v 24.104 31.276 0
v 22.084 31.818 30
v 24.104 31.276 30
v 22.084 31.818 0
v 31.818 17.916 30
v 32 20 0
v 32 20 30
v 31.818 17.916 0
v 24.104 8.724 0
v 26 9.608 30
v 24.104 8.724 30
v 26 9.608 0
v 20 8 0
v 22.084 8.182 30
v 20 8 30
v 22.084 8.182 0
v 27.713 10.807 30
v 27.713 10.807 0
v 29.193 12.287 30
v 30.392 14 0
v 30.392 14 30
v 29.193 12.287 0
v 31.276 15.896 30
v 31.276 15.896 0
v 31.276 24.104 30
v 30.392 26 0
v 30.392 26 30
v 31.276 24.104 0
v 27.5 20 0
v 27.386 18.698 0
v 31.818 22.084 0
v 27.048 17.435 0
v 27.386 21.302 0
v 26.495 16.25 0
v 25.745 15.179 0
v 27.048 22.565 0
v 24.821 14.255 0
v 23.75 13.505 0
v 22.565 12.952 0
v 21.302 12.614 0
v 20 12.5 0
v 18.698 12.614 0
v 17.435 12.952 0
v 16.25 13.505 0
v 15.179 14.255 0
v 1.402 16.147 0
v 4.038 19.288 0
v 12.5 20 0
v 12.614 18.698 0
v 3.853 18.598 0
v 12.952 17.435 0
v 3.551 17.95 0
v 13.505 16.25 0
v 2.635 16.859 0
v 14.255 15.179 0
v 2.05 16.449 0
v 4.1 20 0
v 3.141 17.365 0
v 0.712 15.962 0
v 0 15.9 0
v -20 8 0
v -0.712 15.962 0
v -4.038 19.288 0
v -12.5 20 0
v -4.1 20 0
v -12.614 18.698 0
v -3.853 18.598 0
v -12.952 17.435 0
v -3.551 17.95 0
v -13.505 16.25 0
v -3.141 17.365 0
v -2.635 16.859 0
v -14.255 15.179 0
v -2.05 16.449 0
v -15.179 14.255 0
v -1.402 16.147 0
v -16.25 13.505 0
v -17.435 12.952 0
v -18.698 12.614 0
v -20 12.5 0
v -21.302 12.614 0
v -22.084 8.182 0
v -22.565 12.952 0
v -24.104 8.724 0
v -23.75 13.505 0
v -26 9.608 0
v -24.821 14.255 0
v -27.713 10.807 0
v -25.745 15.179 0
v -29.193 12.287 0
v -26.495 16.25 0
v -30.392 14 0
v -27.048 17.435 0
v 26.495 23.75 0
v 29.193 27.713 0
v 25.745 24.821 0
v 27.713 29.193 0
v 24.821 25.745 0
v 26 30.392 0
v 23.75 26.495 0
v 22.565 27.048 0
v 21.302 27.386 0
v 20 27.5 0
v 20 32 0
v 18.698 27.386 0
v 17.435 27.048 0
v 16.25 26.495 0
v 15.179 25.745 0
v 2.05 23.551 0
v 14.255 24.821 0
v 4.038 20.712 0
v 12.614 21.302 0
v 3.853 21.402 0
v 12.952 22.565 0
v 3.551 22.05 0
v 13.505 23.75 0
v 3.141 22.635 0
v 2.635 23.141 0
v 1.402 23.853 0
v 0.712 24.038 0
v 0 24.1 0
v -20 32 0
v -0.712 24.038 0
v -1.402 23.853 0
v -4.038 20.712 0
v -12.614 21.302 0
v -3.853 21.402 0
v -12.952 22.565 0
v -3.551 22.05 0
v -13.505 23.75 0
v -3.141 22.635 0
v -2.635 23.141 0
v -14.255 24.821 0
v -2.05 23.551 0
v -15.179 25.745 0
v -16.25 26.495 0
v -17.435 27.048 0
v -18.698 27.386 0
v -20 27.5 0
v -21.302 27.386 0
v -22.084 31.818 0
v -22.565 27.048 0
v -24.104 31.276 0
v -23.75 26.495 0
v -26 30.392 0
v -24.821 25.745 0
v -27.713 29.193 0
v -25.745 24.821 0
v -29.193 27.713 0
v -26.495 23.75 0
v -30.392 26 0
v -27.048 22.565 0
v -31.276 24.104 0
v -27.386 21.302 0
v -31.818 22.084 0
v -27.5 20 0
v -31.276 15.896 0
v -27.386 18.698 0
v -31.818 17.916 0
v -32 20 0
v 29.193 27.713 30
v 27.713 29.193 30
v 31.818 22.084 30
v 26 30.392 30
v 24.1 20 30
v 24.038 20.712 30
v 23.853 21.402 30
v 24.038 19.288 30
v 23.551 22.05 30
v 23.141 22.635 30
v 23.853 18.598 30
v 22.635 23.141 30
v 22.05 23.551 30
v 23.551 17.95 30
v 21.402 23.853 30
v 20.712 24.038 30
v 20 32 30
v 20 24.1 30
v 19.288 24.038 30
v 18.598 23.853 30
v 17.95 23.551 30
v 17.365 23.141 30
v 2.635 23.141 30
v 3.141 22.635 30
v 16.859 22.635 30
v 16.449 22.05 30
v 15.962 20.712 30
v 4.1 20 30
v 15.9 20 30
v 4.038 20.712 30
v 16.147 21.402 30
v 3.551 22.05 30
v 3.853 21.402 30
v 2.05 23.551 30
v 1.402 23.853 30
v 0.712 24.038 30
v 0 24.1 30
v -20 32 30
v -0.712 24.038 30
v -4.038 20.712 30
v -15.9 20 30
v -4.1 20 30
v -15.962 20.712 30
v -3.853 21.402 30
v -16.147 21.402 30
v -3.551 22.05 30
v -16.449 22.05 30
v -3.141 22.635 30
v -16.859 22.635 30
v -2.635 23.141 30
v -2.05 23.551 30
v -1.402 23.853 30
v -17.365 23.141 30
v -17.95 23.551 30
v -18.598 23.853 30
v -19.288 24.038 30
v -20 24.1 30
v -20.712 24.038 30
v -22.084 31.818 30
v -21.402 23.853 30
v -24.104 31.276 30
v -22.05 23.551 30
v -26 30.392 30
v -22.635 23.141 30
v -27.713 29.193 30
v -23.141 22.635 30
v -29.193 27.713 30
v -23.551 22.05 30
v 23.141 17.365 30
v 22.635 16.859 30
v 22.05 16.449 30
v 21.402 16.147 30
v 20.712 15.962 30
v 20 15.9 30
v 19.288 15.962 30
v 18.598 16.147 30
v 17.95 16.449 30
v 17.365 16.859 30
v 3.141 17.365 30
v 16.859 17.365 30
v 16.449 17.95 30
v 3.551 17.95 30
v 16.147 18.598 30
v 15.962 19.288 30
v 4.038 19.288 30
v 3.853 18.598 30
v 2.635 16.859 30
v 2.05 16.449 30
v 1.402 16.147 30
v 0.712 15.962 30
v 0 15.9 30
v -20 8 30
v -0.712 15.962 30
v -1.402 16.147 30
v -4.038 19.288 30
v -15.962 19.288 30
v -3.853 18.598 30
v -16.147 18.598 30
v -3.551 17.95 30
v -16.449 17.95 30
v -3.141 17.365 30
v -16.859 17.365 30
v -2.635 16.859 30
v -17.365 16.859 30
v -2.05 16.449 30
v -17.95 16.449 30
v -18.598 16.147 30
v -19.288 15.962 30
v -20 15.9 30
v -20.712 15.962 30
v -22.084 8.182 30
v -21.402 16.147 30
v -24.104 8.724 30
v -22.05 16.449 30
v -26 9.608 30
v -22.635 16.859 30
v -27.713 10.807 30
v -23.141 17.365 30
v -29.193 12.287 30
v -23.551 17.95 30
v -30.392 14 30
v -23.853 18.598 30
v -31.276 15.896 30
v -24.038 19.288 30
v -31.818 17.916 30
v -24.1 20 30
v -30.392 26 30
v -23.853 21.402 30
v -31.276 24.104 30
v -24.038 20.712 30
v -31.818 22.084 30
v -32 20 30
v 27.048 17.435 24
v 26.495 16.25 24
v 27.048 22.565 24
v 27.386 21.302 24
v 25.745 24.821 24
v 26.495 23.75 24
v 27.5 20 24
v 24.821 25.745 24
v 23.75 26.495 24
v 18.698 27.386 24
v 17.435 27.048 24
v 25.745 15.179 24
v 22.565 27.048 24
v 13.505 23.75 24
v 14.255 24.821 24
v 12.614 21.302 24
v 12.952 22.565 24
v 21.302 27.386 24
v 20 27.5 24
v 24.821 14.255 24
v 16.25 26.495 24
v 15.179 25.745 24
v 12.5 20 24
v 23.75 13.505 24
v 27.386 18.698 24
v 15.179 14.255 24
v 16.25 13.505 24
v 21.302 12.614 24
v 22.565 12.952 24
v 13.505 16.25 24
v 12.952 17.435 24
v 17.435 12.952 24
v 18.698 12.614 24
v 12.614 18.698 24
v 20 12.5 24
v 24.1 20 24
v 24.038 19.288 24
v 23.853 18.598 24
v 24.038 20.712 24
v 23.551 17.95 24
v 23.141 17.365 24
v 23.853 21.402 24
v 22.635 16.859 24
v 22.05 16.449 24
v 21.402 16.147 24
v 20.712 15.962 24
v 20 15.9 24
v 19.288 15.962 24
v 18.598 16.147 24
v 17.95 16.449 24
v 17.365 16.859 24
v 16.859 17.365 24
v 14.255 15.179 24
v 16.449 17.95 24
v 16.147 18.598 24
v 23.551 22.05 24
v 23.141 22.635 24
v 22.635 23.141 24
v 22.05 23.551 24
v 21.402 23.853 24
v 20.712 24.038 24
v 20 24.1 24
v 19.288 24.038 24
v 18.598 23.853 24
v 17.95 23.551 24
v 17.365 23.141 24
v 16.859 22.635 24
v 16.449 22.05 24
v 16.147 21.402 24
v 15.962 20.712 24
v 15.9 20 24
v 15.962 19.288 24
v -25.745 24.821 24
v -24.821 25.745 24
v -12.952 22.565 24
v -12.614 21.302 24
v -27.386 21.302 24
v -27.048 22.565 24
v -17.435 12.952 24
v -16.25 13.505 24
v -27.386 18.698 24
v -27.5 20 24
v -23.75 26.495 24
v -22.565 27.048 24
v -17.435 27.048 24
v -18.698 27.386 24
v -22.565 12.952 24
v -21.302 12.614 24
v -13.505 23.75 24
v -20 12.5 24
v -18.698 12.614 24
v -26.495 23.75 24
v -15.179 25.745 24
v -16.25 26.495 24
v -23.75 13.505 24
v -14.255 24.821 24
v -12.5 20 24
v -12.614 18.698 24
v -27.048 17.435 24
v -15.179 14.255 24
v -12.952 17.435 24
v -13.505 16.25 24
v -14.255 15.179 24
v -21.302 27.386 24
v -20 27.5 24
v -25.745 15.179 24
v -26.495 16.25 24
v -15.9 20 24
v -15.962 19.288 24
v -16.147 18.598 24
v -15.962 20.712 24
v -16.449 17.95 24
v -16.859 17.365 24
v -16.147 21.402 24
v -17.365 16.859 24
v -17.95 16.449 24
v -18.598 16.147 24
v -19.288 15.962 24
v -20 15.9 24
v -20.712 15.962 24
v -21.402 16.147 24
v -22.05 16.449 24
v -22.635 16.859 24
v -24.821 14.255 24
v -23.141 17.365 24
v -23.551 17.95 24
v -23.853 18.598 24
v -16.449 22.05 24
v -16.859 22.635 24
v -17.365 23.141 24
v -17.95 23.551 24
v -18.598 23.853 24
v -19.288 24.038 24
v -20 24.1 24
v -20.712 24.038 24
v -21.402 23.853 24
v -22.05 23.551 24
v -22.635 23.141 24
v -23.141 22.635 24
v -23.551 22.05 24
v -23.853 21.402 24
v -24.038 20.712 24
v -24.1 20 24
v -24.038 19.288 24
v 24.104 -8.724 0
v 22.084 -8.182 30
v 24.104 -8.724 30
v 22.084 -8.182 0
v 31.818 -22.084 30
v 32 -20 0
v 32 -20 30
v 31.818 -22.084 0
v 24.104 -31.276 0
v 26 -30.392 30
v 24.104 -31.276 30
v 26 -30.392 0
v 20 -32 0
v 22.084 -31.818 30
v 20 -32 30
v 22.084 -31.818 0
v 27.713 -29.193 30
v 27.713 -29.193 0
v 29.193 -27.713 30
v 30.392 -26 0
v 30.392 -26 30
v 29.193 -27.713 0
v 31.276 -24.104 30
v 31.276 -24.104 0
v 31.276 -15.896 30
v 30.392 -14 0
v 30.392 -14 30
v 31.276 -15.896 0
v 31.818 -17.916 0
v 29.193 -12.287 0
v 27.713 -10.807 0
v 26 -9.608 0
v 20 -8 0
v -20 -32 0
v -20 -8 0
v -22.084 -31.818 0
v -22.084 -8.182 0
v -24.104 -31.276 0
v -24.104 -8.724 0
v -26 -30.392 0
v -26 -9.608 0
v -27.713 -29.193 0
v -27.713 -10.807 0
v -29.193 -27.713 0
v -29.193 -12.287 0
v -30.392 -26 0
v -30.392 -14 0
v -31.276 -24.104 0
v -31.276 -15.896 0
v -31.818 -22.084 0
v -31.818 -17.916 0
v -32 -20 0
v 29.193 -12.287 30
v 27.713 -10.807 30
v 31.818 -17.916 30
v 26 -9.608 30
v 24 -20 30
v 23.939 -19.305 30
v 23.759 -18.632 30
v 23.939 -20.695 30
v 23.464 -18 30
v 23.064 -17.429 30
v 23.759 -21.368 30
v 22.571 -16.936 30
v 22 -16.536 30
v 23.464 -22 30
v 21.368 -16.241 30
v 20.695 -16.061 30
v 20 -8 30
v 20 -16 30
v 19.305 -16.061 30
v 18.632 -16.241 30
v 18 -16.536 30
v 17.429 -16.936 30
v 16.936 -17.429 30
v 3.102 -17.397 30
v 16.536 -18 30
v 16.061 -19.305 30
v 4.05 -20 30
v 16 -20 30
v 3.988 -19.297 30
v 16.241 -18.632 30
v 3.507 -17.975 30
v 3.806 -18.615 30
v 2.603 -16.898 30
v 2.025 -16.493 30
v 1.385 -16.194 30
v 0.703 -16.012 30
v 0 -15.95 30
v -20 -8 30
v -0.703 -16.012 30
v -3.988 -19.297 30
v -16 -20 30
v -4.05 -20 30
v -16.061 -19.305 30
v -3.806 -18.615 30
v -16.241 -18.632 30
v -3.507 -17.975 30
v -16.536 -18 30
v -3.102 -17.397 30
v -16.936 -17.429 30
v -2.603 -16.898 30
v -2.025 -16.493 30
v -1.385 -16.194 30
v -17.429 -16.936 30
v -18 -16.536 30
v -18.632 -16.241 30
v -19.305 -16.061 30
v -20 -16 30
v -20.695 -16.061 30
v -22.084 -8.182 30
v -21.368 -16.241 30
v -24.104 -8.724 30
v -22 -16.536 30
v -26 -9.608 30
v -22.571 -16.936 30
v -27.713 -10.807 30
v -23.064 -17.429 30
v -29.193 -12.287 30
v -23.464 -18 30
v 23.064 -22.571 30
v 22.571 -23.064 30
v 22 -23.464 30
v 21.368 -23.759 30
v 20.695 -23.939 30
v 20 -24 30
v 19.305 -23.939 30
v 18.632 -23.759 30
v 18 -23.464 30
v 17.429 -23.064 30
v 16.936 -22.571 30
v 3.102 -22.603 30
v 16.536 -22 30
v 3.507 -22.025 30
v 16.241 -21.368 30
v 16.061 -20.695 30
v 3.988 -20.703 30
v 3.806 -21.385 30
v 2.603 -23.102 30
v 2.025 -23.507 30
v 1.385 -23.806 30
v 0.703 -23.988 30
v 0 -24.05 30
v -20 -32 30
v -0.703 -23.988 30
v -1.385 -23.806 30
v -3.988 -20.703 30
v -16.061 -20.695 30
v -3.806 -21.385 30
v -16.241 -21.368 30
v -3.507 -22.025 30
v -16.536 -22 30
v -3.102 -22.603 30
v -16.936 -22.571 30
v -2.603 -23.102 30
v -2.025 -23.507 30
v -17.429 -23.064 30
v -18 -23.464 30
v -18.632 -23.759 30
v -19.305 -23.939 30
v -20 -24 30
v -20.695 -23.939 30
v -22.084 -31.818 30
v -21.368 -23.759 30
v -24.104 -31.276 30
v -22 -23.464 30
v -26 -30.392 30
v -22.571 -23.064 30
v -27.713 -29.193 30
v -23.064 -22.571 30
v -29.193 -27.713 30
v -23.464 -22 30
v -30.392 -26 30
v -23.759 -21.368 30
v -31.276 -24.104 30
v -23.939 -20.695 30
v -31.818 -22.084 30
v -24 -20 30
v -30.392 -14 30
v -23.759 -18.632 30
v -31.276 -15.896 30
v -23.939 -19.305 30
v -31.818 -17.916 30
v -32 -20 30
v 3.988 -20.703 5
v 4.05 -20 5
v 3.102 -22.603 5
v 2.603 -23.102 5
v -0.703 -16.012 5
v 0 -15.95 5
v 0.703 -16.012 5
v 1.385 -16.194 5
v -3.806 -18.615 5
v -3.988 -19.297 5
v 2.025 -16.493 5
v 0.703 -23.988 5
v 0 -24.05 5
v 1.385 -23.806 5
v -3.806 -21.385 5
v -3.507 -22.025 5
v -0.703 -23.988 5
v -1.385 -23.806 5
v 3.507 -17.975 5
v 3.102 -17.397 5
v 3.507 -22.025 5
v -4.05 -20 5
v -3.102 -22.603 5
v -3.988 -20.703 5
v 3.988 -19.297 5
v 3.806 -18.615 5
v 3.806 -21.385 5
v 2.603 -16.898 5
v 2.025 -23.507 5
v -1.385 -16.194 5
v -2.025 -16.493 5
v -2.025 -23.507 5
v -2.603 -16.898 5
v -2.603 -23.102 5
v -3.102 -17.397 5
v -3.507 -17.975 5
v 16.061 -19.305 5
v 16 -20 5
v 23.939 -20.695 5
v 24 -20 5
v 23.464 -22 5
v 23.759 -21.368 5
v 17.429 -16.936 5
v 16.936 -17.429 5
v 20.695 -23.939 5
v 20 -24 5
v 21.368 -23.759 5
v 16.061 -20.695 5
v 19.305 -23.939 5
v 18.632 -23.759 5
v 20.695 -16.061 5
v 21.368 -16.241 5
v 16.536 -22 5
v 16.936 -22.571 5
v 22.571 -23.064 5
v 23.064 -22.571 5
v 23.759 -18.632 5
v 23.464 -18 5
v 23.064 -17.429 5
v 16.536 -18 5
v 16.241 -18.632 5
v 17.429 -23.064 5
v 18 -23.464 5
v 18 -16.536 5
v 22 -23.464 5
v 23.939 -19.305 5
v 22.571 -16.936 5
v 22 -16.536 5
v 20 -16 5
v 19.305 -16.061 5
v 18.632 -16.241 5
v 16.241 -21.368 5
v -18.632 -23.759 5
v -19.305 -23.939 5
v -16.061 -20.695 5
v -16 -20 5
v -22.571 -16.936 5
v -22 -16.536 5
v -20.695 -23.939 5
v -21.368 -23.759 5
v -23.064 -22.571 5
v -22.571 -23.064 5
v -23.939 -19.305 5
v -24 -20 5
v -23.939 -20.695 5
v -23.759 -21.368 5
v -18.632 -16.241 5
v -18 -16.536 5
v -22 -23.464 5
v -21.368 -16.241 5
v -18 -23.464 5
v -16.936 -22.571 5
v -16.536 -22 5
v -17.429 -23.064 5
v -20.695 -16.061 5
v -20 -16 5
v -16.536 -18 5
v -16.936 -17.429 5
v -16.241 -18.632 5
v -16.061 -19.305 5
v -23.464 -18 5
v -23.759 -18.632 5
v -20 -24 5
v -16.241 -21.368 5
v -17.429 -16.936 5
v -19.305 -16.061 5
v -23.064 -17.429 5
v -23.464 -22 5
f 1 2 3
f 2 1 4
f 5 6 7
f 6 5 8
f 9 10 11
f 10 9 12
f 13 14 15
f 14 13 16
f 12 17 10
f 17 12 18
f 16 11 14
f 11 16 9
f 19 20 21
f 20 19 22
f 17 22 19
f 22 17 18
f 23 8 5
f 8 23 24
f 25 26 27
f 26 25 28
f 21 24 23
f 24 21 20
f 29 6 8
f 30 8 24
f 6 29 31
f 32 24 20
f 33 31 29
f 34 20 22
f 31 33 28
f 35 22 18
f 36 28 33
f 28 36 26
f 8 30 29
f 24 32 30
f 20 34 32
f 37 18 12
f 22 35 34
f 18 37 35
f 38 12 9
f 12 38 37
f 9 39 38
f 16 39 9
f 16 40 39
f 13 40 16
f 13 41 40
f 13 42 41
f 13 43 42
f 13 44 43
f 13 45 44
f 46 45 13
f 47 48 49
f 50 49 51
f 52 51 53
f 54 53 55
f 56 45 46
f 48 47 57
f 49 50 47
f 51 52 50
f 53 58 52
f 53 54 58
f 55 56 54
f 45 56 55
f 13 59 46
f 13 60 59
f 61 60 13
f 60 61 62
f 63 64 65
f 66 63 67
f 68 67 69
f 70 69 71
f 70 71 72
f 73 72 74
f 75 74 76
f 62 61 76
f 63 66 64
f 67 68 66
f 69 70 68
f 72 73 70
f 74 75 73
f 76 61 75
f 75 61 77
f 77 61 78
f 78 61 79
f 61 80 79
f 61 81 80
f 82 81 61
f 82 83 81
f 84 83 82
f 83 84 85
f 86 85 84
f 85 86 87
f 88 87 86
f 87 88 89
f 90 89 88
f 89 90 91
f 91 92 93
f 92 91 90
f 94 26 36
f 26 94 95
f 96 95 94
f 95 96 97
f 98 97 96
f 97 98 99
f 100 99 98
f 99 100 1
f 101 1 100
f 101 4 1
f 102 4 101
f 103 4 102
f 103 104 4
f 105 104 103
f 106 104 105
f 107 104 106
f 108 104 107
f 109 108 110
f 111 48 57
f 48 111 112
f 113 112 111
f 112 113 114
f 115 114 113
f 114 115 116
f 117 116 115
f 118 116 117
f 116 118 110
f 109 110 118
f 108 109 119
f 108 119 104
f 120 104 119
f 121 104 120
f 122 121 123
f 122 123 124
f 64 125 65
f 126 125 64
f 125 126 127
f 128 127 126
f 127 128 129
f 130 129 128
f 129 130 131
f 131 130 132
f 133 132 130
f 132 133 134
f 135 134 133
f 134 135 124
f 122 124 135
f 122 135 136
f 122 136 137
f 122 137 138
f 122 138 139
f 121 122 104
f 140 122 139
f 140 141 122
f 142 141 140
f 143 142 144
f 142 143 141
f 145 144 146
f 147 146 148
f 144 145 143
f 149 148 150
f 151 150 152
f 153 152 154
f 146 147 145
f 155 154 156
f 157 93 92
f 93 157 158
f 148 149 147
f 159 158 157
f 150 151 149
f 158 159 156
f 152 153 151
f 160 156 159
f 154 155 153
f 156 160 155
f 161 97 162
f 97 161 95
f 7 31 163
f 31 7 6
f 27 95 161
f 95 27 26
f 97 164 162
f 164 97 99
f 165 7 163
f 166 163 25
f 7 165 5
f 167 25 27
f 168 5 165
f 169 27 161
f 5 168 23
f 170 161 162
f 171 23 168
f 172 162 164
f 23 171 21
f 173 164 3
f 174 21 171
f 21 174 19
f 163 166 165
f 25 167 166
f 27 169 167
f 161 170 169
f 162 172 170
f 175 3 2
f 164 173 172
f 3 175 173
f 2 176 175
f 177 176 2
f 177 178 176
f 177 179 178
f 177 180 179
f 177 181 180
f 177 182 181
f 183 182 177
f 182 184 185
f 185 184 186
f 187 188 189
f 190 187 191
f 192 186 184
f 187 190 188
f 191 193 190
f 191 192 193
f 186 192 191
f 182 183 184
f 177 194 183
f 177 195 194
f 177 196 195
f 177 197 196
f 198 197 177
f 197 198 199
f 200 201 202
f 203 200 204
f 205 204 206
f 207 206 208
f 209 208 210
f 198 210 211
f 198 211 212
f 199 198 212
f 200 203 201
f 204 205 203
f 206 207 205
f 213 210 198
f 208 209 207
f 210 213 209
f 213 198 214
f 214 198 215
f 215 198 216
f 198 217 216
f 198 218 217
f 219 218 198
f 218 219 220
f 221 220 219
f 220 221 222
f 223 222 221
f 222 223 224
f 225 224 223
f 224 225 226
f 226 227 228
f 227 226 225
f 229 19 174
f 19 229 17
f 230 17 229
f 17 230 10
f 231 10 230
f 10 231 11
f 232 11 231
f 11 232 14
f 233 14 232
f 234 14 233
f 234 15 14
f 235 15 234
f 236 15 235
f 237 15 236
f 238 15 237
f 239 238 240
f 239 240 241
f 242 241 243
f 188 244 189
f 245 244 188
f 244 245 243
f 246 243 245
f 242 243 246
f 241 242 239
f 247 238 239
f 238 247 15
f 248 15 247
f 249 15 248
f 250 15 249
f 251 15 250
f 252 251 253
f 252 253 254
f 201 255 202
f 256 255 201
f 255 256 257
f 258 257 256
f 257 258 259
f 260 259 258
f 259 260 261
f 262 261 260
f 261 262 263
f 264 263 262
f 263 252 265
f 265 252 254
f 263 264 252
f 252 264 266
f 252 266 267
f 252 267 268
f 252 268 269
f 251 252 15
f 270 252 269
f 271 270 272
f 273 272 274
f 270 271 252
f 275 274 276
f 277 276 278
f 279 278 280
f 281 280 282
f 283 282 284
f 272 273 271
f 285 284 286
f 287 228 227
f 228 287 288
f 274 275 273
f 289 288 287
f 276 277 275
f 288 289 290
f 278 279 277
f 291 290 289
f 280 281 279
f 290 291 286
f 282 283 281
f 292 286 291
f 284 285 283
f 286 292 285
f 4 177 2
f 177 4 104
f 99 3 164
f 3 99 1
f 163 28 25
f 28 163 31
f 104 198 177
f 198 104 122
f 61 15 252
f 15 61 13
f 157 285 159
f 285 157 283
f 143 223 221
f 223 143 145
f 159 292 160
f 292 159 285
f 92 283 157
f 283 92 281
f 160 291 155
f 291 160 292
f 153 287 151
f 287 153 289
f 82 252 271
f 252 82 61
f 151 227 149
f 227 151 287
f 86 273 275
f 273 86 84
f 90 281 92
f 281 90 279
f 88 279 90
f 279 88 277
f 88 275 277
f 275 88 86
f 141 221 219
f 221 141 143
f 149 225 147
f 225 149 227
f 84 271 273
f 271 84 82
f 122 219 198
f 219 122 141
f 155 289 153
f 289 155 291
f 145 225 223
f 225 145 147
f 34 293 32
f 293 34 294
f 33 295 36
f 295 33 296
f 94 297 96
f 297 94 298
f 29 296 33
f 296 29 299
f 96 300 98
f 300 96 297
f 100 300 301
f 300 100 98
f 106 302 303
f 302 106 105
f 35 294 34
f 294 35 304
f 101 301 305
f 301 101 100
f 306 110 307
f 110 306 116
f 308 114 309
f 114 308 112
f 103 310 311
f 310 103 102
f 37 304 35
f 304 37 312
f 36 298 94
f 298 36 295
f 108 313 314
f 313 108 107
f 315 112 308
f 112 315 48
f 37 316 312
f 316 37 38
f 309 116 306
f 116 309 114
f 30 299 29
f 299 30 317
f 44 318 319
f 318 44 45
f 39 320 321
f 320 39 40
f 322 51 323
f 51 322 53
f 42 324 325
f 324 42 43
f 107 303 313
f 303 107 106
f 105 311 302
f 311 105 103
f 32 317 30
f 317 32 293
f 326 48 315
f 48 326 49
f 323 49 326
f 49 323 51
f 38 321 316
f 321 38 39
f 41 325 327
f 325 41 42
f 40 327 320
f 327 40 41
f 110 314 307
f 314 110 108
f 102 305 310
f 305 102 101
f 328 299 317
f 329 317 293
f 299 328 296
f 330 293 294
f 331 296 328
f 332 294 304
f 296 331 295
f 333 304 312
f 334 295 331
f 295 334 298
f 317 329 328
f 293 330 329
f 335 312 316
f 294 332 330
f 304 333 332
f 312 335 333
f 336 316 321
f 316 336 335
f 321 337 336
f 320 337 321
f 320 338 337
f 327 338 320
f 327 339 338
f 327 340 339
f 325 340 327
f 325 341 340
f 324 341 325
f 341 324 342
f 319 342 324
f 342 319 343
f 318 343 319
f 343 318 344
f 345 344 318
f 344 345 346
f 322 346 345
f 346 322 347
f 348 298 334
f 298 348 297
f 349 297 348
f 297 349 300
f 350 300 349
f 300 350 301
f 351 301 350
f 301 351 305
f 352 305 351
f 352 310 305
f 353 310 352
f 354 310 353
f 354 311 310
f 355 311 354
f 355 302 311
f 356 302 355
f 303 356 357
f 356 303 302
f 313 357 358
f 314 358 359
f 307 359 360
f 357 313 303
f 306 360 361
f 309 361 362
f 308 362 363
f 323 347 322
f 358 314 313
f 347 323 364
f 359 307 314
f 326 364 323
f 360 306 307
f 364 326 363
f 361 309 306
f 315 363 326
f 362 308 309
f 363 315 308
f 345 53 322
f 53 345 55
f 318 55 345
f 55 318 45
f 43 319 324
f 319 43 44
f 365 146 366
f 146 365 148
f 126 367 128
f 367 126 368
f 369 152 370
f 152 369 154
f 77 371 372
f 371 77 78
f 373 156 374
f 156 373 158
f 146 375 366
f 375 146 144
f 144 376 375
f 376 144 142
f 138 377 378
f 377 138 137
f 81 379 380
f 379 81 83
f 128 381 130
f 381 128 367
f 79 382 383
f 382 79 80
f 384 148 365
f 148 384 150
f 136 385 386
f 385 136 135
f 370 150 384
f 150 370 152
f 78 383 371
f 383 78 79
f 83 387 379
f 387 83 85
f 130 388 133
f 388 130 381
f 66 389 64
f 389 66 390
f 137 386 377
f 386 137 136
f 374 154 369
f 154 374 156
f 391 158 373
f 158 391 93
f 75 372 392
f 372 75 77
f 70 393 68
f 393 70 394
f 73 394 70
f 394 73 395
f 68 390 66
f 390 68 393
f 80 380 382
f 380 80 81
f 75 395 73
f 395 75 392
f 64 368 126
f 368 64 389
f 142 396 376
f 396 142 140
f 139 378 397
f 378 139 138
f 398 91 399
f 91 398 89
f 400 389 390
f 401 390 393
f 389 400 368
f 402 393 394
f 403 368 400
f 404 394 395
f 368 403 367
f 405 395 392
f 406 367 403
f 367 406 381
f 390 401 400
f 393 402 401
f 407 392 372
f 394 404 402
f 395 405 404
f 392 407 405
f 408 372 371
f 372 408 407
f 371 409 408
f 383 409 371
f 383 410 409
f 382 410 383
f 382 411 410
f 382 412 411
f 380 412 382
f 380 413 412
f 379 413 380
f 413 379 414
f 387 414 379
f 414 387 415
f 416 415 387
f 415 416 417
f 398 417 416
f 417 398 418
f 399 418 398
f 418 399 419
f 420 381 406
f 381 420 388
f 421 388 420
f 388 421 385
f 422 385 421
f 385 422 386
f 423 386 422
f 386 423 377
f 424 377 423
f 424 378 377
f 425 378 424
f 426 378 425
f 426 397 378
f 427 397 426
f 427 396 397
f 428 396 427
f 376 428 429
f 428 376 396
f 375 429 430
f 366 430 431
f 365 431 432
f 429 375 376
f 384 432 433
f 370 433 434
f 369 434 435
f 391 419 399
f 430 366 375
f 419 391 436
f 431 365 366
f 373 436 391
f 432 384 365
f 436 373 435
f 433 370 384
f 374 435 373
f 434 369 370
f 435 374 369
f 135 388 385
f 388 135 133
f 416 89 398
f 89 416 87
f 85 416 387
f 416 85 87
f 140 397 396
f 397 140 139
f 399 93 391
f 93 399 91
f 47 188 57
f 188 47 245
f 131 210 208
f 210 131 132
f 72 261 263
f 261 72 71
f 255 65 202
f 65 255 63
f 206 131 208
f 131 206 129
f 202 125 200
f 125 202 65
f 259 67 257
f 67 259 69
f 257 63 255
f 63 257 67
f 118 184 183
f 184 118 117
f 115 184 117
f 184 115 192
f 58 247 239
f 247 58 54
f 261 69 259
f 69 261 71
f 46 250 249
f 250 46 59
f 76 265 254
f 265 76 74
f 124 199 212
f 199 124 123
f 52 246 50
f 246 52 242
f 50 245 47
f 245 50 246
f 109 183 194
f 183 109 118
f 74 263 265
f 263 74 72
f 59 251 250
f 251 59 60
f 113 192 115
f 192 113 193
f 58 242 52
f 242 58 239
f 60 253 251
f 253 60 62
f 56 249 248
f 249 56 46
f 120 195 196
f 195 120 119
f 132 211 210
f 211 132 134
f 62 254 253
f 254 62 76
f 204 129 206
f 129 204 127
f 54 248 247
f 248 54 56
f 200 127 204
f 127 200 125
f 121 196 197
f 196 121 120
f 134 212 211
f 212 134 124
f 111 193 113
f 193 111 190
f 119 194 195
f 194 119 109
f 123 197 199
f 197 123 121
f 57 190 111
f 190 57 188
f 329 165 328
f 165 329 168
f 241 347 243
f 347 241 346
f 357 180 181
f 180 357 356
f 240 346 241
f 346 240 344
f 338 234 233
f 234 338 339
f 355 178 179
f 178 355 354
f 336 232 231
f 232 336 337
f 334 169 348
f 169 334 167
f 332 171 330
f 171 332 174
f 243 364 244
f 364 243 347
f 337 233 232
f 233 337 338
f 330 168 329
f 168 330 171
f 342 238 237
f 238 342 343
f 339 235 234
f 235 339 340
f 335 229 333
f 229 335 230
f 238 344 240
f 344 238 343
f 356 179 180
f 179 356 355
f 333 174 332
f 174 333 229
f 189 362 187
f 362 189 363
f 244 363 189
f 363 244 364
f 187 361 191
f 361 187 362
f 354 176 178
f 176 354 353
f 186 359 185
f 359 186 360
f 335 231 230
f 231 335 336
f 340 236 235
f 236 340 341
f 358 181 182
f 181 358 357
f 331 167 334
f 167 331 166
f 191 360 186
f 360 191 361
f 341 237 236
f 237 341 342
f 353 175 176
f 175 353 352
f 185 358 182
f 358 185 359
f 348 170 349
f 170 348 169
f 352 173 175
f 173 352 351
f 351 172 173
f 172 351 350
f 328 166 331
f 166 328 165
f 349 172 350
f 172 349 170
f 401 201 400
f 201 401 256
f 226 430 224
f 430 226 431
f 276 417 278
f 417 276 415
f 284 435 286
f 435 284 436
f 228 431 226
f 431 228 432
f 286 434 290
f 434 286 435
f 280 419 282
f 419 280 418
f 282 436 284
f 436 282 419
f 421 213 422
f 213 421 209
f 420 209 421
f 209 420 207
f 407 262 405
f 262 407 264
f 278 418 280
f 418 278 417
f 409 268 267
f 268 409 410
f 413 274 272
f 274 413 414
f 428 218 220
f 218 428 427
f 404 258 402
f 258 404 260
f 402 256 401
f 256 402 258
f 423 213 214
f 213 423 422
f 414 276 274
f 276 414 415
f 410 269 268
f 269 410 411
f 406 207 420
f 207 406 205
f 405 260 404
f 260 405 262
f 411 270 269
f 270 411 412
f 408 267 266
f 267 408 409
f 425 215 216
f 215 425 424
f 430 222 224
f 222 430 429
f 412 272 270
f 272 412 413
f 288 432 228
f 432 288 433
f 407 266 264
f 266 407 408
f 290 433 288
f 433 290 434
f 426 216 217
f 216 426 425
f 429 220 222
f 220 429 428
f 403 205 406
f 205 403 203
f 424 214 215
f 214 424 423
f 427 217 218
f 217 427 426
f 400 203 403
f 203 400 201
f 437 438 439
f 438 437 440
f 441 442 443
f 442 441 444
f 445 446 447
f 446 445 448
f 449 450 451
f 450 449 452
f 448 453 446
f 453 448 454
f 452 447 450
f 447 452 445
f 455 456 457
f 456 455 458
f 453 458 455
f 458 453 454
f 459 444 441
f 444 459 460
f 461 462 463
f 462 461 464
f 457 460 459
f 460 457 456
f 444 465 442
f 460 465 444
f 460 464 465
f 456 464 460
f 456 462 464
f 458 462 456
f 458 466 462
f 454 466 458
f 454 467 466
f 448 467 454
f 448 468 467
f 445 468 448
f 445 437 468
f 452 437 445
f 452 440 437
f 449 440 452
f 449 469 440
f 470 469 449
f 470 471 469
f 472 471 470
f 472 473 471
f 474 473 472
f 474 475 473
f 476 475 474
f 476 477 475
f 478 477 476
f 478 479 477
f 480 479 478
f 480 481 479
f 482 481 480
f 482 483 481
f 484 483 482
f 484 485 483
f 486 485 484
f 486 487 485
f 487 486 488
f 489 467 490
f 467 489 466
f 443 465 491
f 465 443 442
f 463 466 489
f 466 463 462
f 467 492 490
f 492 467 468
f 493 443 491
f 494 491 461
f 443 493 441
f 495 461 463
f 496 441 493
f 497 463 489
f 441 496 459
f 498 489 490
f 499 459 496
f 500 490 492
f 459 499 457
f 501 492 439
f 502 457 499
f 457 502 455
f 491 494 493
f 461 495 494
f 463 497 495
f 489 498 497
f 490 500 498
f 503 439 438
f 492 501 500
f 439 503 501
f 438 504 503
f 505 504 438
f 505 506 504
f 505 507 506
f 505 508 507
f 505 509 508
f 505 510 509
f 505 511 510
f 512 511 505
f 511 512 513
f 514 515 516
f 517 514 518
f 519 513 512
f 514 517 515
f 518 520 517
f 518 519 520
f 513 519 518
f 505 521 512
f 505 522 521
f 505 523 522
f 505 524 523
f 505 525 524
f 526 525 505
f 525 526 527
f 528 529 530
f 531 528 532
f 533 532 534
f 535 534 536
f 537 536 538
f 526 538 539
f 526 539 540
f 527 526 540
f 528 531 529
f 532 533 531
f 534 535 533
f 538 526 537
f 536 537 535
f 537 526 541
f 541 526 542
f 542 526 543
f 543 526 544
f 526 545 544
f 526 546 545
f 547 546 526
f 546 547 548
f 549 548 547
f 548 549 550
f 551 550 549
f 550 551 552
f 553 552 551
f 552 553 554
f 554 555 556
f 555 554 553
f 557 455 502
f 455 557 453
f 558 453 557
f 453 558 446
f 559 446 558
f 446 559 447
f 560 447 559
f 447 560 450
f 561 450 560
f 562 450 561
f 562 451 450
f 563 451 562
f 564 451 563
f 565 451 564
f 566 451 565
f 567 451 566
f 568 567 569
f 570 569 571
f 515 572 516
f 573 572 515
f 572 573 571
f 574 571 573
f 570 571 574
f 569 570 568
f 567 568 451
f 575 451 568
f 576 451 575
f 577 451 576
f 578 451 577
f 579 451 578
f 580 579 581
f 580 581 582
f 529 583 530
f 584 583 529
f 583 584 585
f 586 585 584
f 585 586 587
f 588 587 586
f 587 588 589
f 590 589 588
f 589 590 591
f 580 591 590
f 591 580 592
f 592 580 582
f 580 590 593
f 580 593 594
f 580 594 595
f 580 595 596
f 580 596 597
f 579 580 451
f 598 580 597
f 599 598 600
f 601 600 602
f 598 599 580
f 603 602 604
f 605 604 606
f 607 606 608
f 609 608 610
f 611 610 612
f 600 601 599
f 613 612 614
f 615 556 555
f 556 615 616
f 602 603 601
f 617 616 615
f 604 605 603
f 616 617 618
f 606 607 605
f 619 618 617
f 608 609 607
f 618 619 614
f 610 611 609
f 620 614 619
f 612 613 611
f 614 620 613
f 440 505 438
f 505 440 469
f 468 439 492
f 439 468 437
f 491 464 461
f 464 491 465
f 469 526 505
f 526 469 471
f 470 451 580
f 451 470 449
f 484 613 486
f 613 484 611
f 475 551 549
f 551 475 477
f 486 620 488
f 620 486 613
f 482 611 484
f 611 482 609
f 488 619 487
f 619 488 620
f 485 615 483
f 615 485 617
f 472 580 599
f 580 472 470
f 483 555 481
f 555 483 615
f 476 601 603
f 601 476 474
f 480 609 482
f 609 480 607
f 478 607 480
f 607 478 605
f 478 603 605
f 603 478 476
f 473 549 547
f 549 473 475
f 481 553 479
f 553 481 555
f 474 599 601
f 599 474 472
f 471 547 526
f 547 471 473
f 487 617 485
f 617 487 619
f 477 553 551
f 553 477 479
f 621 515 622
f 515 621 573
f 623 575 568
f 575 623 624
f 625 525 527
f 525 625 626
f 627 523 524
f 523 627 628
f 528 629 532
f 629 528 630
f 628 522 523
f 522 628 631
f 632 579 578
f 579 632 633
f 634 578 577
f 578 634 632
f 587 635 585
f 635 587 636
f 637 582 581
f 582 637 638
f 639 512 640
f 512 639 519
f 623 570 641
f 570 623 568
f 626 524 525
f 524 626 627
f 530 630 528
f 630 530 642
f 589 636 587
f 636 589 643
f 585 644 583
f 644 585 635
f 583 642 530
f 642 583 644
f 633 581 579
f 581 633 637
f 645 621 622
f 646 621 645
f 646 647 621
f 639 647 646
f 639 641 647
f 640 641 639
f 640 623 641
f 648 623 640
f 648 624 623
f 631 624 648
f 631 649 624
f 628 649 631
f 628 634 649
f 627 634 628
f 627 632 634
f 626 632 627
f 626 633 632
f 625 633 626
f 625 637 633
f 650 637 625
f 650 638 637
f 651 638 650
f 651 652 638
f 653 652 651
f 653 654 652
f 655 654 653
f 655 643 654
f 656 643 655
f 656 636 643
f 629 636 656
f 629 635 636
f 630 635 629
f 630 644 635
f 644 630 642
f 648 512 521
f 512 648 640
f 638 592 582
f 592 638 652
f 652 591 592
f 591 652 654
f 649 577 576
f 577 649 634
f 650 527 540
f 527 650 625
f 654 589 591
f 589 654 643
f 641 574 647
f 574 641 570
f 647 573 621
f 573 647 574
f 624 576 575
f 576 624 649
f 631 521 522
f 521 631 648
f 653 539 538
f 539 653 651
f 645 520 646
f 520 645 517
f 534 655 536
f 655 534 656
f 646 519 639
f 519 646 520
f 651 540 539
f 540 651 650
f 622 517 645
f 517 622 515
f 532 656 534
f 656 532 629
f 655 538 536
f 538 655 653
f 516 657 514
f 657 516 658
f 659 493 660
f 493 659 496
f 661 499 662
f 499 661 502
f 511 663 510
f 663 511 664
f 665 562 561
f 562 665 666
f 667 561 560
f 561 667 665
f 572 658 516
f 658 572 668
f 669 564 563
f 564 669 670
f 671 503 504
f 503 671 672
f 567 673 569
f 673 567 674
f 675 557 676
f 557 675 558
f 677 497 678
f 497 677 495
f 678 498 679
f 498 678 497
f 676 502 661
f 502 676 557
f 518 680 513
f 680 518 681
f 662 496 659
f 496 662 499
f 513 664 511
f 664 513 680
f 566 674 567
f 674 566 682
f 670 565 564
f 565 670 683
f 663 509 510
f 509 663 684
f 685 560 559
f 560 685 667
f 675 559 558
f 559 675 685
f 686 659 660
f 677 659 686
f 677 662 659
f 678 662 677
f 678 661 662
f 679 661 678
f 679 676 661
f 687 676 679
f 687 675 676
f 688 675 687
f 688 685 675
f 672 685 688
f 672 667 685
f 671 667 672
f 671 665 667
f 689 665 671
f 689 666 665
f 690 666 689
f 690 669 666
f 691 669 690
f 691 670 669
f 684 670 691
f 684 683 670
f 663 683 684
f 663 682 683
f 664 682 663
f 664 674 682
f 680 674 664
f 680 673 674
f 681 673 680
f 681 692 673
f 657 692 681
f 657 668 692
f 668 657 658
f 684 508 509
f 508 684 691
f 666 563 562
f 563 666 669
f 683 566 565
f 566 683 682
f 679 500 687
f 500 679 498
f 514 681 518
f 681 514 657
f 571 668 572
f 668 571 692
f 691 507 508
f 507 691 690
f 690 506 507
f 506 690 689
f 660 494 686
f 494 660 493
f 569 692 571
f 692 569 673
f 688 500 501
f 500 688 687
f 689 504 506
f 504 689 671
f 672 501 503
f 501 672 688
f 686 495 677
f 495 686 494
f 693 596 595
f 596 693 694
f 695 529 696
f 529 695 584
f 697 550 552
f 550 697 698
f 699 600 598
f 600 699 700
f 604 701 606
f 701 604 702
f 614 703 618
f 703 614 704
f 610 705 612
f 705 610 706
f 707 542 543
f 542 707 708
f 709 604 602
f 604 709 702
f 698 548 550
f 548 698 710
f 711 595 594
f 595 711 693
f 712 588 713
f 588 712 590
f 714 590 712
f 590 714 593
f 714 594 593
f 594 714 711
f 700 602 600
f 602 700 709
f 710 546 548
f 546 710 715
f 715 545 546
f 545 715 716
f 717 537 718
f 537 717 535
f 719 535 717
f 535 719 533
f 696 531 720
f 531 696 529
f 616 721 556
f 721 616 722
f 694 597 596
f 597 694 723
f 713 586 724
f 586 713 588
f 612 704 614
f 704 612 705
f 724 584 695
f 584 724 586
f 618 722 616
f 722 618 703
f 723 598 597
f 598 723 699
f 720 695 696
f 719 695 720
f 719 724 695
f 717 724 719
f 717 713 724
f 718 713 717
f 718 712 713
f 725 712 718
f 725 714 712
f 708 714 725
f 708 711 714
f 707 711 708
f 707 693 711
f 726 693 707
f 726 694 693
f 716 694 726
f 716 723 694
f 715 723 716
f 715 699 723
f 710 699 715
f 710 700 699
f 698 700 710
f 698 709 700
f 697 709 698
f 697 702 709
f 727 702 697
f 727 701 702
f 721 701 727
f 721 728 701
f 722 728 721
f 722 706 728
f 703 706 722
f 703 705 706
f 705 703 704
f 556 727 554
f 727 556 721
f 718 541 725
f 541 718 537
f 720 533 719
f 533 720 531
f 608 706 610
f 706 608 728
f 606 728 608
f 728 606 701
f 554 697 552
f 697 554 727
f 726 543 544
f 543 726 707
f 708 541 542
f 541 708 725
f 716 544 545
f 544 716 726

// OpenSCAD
$fn=36;

d=20;
//linear_extrude(15) circle(4.15);
translate([0,20,0]) car(d);
module car(d) {
    difference() {
        union() {
            translate([d, 0, 0]) linear_extrude(30) circle(12);

            linear_extrude(30) square([d*2, 24],true);

            translate([-d, 0, 0]) linear_extrude(30) circle(12);
        }
        translate([d, 0, 0]) linear_extrude(24) circle(7.5);
        translate([-d, 0, 0]) linear_extrude(24) circle(7.5);
        
        translate([0, 0, 0]) linear_extrude(100) circle(4.10);
        translate([d, 0, 0]) linear_extrude(100) circle(4.10);
        translate([-d, 0, 0]) linear_extrude(100) circle(4.10);
    }
}

translate([0,-20,0]) frame(d);
module frame(d) {
    difference() {
        union() {
            translate([d, 0, 0]) linear_extrude(30) circle(12);

            linear_extrude(30) square([d*2, 24],true);

            translate([-d, 0, 0]) linear_extrude(30) circle(12);
        }
        translate([0, 0, 5]) linear_extrude(100) circle(4.05);
        translate([d, 0, 5]) linear_extrude(100) circle(4);
        translate([-d, 0, 5]) linear_extrude(100) circle(4);        
    }
}
